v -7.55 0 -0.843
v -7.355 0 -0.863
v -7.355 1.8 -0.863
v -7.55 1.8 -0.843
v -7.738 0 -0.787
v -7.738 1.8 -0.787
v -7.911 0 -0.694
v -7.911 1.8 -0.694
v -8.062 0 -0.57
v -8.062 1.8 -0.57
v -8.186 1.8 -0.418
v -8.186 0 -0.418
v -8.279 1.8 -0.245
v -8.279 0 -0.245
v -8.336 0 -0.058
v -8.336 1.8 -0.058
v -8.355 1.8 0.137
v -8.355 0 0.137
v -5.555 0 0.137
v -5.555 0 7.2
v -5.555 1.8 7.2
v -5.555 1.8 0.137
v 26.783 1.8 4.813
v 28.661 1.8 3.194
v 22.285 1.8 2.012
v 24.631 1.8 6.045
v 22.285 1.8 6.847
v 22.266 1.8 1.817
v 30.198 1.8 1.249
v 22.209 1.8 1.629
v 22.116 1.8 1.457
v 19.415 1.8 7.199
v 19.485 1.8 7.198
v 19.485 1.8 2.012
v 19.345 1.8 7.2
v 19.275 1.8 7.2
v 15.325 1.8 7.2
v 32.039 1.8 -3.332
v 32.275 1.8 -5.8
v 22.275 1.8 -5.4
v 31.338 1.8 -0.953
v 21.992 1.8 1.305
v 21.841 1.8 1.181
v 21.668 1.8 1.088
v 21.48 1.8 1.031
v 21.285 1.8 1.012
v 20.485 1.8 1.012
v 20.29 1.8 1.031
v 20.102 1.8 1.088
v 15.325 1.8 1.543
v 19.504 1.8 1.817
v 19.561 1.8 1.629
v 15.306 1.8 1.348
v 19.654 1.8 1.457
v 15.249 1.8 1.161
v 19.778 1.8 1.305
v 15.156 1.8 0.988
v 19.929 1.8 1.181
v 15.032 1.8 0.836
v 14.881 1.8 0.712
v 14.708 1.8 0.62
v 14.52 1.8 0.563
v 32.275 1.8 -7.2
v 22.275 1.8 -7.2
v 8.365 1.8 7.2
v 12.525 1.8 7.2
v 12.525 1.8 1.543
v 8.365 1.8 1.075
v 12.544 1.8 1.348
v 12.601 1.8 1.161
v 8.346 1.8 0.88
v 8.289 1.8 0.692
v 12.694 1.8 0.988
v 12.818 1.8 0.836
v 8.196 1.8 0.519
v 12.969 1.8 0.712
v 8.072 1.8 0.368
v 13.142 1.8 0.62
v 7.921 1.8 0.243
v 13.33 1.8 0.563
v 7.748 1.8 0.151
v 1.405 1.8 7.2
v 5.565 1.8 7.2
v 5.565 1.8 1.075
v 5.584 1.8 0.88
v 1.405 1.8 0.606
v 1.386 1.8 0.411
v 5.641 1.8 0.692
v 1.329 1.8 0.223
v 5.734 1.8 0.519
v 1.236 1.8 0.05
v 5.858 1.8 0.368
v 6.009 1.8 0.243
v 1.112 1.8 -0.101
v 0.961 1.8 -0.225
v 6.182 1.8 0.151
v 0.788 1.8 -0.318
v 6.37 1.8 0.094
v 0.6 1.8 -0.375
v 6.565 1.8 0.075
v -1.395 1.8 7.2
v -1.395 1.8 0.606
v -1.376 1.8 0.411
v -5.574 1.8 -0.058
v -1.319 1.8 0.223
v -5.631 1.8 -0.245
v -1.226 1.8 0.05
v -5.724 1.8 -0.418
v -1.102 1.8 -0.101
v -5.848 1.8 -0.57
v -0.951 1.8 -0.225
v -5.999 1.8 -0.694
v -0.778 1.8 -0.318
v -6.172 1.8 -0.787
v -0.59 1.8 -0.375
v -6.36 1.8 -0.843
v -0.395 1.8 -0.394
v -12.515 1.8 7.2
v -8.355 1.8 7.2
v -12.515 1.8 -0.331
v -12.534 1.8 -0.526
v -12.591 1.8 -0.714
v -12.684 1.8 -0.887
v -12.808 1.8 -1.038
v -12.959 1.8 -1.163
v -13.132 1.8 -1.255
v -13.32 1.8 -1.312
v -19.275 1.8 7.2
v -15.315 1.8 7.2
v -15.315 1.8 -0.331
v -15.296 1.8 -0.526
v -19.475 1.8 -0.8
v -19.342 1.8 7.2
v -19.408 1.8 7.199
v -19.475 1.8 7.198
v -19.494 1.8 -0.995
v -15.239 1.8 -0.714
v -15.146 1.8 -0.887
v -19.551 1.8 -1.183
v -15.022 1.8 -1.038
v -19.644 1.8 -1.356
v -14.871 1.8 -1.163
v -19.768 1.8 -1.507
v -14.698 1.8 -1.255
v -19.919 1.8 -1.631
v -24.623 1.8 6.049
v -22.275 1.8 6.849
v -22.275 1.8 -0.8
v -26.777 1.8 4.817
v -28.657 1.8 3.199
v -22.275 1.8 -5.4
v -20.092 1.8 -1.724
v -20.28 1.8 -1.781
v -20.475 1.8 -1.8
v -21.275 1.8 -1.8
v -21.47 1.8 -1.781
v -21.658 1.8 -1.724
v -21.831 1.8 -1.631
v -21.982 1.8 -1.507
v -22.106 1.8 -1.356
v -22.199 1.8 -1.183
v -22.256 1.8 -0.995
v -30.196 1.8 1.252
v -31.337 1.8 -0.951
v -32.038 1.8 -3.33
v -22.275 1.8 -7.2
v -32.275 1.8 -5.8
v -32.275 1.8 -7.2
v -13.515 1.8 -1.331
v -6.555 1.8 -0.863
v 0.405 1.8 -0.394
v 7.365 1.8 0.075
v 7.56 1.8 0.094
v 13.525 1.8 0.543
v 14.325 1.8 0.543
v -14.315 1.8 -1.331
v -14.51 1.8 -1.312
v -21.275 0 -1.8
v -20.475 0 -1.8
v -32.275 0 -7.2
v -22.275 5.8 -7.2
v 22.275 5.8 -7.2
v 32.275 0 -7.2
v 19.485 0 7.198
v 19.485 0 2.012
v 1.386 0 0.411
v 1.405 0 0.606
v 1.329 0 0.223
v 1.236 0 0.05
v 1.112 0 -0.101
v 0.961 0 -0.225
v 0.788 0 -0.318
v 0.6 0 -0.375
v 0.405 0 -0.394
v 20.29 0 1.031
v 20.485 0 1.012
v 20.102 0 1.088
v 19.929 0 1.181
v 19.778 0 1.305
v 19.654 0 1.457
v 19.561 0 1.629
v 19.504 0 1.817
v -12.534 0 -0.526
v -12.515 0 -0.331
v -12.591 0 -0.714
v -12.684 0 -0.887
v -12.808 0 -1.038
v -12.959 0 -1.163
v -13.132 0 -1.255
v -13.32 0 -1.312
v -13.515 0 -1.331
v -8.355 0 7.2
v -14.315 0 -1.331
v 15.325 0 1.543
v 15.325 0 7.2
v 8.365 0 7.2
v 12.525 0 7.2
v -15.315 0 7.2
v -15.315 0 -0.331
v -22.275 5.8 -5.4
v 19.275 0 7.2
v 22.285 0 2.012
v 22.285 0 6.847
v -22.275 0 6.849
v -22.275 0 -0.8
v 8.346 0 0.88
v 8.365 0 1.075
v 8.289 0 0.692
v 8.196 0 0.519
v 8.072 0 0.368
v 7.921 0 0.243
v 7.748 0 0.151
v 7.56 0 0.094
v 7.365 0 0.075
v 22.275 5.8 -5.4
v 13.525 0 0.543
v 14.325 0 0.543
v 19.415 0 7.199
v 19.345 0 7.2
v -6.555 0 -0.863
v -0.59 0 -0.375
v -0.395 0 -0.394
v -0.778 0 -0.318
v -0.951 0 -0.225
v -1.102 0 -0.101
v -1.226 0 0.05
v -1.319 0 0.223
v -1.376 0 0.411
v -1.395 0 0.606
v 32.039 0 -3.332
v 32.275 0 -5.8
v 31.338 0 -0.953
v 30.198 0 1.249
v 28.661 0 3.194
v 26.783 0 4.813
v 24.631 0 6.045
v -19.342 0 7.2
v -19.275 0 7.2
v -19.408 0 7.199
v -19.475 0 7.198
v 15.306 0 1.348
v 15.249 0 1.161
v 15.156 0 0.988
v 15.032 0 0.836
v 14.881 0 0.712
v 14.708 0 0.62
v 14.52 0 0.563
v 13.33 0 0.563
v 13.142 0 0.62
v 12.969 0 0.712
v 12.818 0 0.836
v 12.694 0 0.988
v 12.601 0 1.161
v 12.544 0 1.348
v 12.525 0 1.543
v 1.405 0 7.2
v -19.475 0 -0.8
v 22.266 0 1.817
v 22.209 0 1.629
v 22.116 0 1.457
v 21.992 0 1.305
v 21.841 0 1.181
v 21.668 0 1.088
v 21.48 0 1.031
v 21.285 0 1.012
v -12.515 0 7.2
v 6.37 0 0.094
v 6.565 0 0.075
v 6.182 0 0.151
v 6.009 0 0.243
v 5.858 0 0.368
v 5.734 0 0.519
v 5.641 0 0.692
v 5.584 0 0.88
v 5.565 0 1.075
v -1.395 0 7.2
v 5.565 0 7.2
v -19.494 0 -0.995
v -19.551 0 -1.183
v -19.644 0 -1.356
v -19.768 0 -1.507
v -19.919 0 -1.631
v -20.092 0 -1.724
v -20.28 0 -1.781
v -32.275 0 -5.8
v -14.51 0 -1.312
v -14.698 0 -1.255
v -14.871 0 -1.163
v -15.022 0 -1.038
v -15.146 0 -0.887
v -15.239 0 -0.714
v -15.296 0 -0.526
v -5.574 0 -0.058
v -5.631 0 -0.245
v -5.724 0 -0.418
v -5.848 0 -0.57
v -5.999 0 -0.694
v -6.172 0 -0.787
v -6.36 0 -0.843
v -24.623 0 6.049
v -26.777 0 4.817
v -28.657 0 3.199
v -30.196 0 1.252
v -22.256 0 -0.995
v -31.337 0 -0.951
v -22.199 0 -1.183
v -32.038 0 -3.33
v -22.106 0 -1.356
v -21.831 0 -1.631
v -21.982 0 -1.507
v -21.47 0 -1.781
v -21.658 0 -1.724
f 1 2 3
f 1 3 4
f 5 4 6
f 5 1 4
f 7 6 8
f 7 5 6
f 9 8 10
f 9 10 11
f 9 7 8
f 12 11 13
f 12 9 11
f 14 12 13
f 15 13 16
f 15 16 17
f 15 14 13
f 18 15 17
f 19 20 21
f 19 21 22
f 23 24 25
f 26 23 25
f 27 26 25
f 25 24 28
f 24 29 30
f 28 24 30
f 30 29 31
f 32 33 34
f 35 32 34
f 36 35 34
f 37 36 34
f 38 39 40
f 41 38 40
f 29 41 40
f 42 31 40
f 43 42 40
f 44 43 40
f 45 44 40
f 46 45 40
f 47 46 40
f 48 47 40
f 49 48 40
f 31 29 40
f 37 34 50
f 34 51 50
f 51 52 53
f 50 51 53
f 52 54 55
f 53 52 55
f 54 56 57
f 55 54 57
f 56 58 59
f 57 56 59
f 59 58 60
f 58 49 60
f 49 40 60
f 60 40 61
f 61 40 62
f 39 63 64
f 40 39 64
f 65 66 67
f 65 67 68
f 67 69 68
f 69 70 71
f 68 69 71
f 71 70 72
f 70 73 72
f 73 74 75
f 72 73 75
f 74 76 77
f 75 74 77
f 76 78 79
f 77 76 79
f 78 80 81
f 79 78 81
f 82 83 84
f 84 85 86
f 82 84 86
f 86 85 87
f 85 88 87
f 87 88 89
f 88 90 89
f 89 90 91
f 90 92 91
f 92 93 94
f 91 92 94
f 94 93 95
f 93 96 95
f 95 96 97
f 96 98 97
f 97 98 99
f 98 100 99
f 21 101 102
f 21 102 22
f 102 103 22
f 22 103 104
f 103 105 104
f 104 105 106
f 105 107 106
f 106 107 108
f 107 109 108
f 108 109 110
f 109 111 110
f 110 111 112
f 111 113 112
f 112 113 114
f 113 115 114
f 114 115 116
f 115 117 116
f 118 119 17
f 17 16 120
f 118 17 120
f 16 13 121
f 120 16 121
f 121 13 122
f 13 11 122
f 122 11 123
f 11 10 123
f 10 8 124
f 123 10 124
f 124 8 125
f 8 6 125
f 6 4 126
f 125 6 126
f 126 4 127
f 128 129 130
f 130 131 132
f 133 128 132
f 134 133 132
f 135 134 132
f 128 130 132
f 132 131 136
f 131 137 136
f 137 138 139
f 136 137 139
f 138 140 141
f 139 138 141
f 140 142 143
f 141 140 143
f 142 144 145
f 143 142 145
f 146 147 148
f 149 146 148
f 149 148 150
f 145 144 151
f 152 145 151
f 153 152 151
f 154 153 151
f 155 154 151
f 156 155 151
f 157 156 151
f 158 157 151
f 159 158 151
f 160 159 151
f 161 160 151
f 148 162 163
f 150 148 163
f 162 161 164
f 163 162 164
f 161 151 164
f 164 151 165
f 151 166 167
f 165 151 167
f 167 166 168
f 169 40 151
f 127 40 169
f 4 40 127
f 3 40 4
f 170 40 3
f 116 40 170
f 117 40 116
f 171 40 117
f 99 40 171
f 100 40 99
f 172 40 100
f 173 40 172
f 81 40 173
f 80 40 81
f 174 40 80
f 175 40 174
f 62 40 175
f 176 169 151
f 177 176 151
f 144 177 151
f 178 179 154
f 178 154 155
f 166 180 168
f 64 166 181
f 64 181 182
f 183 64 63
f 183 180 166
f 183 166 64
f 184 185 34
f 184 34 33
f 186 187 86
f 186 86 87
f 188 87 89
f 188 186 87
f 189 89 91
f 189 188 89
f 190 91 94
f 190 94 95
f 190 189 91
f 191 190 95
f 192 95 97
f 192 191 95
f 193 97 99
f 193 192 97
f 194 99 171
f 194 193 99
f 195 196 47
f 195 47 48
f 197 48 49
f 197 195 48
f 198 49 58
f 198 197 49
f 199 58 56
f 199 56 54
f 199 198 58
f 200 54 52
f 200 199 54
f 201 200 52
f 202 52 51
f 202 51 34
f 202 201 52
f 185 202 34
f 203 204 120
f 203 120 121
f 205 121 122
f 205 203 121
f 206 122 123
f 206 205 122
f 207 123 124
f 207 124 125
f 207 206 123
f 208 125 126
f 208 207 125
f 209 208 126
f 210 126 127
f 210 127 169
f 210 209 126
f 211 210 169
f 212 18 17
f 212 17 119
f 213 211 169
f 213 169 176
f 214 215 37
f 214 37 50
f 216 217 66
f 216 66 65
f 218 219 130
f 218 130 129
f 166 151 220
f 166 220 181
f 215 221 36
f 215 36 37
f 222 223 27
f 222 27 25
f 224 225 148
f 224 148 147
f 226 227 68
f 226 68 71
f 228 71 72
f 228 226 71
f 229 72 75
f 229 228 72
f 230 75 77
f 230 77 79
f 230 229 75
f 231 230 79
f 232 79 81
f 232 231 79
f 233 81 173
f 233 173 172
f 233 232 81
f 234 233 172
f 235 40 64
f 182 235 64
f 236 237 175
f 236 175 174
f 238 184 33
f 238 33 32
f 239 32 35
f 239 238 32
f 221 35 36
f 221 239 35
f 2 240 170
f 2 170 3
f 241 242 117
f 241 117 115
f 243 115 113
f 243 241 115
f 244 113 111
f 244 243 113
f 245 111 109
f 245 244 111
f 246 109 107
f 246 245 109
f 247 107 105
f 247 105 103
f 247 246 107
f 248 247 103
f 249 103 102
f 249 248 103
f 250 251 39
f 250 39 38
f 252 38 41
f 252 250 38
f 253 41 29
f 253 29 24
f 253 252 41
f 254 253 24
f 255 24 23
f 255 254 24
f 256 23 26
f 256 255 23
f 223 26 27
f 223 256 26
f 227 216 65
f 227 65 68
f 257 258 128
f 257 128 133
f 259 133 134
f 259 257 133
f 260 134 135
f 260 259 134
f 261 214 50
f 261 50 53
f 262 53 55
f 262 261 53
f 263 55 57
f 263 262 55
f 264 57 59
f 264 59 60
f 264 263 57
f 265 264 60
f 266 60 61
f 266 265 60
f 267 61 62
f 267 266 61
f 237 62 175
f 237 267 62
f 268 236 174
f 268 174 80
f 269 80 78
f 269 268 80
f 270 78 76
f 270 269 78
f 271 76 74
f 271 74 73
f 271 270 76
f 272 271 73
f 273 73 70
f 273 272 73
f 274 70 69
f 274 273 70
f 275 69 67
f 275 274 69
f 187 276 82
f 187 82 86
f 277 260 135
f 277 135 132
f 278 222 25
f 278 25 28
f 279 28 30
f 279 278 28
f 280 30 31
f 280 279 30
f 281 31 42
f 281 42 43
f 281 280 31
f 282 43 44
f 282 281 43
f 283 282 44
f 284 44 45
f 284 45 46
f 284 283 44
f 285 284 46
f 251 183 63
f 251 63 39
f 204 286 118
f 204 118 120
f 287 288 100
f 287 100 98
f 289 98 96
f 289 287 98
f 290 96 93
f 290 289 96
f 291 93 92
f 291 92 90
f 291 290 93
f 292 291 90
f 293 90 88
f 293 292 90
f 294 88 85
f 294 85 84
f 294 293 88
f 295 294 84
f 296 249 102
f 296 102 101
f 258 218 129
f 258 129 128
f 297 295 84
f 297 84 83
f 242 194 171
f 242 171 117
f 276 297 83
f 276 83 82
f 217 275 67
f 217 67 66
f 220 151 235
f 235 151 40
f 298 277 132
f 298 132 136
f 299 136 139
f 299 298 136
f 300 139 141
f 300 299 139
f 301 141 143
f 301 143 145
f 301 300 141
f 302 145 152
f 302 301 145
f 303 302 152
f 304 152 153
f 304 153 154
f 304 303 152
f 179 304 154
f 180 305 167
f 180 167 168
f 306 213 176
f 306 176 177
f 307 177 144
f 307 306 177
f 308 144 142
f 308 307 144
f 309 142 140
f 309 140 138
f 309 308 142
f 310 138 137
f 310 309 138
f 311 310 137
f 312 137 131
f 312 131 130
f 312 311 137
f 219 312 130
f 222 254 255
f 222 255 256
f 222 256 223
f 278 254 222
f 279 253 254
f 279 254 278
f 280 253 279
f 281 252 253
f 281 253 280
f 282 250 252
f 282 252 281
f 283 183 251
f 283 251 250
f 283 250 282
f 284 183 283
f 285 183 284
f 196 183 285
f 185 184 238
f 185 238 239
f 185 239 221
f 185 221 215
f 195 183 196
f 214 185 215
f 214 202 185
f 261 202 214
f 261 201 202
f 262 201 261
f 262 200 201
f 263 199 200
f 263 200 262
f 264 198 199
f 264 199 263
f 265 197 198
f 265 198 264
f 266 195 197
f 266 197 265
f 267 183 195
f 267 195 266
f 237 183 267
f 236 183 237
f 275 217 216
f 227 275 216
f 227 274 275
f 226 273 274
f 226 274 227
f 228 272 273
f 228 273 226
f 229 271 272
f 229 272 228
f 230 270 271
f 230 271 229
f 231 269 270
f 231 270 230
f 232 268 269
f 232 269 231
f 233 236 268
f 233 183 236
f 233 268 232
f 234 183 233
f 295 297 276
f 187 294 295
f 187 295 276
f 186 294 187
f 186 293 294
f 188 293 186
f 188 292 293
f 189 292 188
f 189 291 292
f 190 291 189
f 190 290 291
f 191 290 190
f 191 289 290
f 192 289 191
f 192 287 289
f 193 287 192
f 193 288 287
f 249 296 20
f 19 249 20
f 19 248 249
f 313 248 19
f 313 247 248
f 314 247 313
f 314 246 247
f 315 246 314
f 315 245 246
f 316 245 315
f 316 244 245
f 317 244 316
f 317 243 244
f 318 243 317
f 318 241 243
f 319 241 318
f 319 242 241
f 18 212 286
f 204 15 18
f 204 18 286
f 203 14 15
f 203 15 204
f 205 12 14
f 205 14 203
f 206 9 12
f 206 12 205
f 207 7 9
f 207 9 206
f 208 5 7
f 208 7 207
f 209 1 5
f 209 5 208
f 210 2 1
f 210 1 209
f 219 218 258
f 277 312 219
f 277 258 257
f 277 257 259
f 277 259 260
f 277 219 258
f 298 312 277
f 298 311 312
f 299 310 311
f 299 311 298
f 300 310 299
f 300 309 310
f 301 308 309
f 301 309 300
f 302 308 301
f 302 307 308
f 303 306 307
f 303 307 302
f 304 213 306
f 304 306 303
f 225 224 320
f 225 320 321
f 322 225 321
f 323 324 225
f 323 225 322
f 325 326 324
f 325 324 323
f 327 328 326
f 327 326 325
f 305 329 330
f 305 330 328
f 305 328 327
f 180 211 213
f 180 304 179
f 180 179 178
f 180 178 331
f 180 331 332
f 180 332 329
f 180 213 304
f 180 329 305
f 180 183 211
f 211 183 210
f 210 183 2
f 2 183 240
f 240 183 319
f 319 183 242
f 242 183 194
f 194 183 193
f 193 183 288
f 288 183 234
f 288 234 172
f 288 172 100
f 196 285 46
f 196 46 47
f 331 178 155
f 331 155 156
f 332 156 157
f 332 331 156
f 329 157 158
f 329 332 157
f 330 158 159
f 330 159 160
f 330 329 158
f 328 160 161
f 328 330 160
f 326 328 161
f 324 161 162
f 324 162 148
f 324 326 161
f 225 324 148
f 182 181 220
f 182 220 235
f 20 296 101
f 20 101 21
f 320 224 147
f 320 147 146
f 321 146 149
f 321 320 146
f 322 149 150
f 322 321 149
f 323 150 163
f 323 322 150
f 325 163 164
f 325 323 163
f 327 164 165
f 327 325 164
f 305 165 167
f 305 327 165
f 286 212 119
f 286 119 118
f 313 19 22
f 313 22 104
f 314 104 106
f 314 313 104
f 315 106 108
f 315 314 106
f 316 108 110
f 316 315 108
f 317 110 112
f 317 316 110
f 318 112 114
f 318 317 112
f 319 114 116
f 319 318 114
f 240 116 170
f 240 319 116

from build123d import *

# Parameters (mm, degrees)
BOSS_EXTRUDE1_DEPTH = 1.8
SKETCH4_W           = 44.55
SKETCH4_H           = 1.8
BOSS_EXTRUDE2_DEPTH = 4


with BuildPart() as part:
    # Sketch2 → Boss-Extrude1 (new body)
    with BuildSketch(Plane(origin=(0, 0, 0), x_dir=(1, 0, 0), z_dir=(0, 1, 0))):
        with BuildLine():
            Line((-32.275, 7.2), (32.275, 7.2))
            Line((32.275, 7.2), (32.275, 5.8))
            ThreePointArc((32.275, 5.8), (29.476225417, -2.258225611), (22.285, -6.846734756))
            Line((22.285, -6.846734756), (22.285, -2.012121212))
            ThreePointArc((22.285, -2.012121212), (21.992106781, -1.305014431), (21.285, -1.012121212))
            Line((21.285, -1.012121212), (20.485, -1.012121212))
            ThreePointArc((20.485, -1.012121212), (19.777893219, -1.305014431), (19.485, -2.012121212))
            Line((19.485, -2.012121212), (19.485, -7.198303735))
            ThreePointArc((19.485, -7.198303735), (19.380003425, -7.199575927), (19.275, -7.2))
            Line((19.275, -7.2), (15.325, -7.2))
            Line((15.325, -7.2), (15.325, -1.543434343))
            ThreePointArc((15.325, -1.543434343), (15.032106781, -0.836327562), (14.325, -0.543434343))
            Line((14.325, -0.543434343), (13.525, -0.543434343))
            ThreePointArc((13.525, -0.543434343), (12.817893219, -0.836327562), (12.525, -1.543434343))
            Line((12.525, -1.543434343), (12.525, -7.2))
            Line((12.525, -7.2), (8.365, -7.2))
            Line((8.365, -7.2), (8.365, -1.074747475))
            ThreePointArc((8.365, -1.074747475), (8.072106781, -0.367640694), (7.365, -0.074747475))
            Line((7.365, -0.074747475), (6.565, -0.074747475))
            ThreePointArc((6.565, -0.074747475), (5.857893219, -0.367640694), (5.565, -1.074747475))
            Line((5.565, -1.074747475), (5.565, -7.2))
            Line((5.565, -7.2), (1.405, -7.2))
            Line((1.405, -7.2), (1.405, -0.606060606))
            ThreePointArc((1.405, -0.606060606), (1.112106781, 0.101046175), (0.405, 0.393939394))
            Line((0.405, 0.393939394), (-0.395, 0.393939394))
            ThreePointArc((-0.395, 0.393939394), (-1.102106781, 0.101046175), (-1.395, -0.606060606))
            Line((-1.395, -0.606060606), (-1.395, -7.2))
            Line((-1.395, -7.2), (-5.555, -7.2))
            Line((-5.555, -7.2), (-5.555, -0.137373737))
            ThreePointArc((-5.555, -0.137373737), (-5.847893219, 0.569733044), (-6.555, 0.862626263))
            Line((-6.555, 0.862626263), (-7.355, 0.862626263))
            ThreePointArc((-7.355, 0.862626263), (-8.062106781, 0.569733044), (-8.355, -0.137373737))
            Line((-8.355, -0.137373737), (-8.355, -7.2))
            Line((-8.355, -7.2), (-12.515, -7.2))
            Line((-12.515, -7.2), (-12.515, 0.331313131))
            ThreePointArc((-12.515, 0.331313131), (-12.807893219, 1.038419912), (-13.515, 1.331313131))
            Line((-13.515, 1.331313131), (-14.315, 1.331313131))
            ThreePointArc((-14.315, 1.331313131), (-15.022106781, 1.038419912), (-15.315, 0.331313131))
            Line((-15.315, 0.331313131), (-15.315, -7.2))
            Line((-15.315, -7.2), (-19.275, -7.2))
            ThreePointArc((-19.275, -7.2), (-19.375002959, -7.199615356), (-19.475, -7.198461447))
            Line((-19.475, -7.198461447), (-19.475, 0.8))
            ThreePointArc((-19.475, 0.8), (-19.767893219, 1.507106781), (-20.475, 1.8))
            Line((-20.475, 1.8), (-21.275, 1.8))
            ThreePointArc((-21.275, 1.8), (-21.982106781, 1.507106781), (-22.275, 0.8))
            Line((-22.275, 0.8), (-22.275, -6.849110641))
            ThreePointArc((-22.275, -6.849110641), (-29.473039027, -2.262257748), (-32.275, 5.8))
            Line((-32.275, 5.8), (-32.275, 7.2))
        make_face()
    extrude(amount=BOSS_EXTRUDE1_DEPTH)

    # Sketch4 → Boss-Extrude2 (add)
    with BuildSketch(Plane(origin=(0, 1.8, 0), x_dir=(1, 0, 0), z_dir=(0, 1, 0))):
        with Locations((0, 6.3)):
            Rectangle(SKETCH4_W, SKETCH4_H)
    extrude(amount=BOSS_EXTRUDE2_DEPTH)


solid = part.part
